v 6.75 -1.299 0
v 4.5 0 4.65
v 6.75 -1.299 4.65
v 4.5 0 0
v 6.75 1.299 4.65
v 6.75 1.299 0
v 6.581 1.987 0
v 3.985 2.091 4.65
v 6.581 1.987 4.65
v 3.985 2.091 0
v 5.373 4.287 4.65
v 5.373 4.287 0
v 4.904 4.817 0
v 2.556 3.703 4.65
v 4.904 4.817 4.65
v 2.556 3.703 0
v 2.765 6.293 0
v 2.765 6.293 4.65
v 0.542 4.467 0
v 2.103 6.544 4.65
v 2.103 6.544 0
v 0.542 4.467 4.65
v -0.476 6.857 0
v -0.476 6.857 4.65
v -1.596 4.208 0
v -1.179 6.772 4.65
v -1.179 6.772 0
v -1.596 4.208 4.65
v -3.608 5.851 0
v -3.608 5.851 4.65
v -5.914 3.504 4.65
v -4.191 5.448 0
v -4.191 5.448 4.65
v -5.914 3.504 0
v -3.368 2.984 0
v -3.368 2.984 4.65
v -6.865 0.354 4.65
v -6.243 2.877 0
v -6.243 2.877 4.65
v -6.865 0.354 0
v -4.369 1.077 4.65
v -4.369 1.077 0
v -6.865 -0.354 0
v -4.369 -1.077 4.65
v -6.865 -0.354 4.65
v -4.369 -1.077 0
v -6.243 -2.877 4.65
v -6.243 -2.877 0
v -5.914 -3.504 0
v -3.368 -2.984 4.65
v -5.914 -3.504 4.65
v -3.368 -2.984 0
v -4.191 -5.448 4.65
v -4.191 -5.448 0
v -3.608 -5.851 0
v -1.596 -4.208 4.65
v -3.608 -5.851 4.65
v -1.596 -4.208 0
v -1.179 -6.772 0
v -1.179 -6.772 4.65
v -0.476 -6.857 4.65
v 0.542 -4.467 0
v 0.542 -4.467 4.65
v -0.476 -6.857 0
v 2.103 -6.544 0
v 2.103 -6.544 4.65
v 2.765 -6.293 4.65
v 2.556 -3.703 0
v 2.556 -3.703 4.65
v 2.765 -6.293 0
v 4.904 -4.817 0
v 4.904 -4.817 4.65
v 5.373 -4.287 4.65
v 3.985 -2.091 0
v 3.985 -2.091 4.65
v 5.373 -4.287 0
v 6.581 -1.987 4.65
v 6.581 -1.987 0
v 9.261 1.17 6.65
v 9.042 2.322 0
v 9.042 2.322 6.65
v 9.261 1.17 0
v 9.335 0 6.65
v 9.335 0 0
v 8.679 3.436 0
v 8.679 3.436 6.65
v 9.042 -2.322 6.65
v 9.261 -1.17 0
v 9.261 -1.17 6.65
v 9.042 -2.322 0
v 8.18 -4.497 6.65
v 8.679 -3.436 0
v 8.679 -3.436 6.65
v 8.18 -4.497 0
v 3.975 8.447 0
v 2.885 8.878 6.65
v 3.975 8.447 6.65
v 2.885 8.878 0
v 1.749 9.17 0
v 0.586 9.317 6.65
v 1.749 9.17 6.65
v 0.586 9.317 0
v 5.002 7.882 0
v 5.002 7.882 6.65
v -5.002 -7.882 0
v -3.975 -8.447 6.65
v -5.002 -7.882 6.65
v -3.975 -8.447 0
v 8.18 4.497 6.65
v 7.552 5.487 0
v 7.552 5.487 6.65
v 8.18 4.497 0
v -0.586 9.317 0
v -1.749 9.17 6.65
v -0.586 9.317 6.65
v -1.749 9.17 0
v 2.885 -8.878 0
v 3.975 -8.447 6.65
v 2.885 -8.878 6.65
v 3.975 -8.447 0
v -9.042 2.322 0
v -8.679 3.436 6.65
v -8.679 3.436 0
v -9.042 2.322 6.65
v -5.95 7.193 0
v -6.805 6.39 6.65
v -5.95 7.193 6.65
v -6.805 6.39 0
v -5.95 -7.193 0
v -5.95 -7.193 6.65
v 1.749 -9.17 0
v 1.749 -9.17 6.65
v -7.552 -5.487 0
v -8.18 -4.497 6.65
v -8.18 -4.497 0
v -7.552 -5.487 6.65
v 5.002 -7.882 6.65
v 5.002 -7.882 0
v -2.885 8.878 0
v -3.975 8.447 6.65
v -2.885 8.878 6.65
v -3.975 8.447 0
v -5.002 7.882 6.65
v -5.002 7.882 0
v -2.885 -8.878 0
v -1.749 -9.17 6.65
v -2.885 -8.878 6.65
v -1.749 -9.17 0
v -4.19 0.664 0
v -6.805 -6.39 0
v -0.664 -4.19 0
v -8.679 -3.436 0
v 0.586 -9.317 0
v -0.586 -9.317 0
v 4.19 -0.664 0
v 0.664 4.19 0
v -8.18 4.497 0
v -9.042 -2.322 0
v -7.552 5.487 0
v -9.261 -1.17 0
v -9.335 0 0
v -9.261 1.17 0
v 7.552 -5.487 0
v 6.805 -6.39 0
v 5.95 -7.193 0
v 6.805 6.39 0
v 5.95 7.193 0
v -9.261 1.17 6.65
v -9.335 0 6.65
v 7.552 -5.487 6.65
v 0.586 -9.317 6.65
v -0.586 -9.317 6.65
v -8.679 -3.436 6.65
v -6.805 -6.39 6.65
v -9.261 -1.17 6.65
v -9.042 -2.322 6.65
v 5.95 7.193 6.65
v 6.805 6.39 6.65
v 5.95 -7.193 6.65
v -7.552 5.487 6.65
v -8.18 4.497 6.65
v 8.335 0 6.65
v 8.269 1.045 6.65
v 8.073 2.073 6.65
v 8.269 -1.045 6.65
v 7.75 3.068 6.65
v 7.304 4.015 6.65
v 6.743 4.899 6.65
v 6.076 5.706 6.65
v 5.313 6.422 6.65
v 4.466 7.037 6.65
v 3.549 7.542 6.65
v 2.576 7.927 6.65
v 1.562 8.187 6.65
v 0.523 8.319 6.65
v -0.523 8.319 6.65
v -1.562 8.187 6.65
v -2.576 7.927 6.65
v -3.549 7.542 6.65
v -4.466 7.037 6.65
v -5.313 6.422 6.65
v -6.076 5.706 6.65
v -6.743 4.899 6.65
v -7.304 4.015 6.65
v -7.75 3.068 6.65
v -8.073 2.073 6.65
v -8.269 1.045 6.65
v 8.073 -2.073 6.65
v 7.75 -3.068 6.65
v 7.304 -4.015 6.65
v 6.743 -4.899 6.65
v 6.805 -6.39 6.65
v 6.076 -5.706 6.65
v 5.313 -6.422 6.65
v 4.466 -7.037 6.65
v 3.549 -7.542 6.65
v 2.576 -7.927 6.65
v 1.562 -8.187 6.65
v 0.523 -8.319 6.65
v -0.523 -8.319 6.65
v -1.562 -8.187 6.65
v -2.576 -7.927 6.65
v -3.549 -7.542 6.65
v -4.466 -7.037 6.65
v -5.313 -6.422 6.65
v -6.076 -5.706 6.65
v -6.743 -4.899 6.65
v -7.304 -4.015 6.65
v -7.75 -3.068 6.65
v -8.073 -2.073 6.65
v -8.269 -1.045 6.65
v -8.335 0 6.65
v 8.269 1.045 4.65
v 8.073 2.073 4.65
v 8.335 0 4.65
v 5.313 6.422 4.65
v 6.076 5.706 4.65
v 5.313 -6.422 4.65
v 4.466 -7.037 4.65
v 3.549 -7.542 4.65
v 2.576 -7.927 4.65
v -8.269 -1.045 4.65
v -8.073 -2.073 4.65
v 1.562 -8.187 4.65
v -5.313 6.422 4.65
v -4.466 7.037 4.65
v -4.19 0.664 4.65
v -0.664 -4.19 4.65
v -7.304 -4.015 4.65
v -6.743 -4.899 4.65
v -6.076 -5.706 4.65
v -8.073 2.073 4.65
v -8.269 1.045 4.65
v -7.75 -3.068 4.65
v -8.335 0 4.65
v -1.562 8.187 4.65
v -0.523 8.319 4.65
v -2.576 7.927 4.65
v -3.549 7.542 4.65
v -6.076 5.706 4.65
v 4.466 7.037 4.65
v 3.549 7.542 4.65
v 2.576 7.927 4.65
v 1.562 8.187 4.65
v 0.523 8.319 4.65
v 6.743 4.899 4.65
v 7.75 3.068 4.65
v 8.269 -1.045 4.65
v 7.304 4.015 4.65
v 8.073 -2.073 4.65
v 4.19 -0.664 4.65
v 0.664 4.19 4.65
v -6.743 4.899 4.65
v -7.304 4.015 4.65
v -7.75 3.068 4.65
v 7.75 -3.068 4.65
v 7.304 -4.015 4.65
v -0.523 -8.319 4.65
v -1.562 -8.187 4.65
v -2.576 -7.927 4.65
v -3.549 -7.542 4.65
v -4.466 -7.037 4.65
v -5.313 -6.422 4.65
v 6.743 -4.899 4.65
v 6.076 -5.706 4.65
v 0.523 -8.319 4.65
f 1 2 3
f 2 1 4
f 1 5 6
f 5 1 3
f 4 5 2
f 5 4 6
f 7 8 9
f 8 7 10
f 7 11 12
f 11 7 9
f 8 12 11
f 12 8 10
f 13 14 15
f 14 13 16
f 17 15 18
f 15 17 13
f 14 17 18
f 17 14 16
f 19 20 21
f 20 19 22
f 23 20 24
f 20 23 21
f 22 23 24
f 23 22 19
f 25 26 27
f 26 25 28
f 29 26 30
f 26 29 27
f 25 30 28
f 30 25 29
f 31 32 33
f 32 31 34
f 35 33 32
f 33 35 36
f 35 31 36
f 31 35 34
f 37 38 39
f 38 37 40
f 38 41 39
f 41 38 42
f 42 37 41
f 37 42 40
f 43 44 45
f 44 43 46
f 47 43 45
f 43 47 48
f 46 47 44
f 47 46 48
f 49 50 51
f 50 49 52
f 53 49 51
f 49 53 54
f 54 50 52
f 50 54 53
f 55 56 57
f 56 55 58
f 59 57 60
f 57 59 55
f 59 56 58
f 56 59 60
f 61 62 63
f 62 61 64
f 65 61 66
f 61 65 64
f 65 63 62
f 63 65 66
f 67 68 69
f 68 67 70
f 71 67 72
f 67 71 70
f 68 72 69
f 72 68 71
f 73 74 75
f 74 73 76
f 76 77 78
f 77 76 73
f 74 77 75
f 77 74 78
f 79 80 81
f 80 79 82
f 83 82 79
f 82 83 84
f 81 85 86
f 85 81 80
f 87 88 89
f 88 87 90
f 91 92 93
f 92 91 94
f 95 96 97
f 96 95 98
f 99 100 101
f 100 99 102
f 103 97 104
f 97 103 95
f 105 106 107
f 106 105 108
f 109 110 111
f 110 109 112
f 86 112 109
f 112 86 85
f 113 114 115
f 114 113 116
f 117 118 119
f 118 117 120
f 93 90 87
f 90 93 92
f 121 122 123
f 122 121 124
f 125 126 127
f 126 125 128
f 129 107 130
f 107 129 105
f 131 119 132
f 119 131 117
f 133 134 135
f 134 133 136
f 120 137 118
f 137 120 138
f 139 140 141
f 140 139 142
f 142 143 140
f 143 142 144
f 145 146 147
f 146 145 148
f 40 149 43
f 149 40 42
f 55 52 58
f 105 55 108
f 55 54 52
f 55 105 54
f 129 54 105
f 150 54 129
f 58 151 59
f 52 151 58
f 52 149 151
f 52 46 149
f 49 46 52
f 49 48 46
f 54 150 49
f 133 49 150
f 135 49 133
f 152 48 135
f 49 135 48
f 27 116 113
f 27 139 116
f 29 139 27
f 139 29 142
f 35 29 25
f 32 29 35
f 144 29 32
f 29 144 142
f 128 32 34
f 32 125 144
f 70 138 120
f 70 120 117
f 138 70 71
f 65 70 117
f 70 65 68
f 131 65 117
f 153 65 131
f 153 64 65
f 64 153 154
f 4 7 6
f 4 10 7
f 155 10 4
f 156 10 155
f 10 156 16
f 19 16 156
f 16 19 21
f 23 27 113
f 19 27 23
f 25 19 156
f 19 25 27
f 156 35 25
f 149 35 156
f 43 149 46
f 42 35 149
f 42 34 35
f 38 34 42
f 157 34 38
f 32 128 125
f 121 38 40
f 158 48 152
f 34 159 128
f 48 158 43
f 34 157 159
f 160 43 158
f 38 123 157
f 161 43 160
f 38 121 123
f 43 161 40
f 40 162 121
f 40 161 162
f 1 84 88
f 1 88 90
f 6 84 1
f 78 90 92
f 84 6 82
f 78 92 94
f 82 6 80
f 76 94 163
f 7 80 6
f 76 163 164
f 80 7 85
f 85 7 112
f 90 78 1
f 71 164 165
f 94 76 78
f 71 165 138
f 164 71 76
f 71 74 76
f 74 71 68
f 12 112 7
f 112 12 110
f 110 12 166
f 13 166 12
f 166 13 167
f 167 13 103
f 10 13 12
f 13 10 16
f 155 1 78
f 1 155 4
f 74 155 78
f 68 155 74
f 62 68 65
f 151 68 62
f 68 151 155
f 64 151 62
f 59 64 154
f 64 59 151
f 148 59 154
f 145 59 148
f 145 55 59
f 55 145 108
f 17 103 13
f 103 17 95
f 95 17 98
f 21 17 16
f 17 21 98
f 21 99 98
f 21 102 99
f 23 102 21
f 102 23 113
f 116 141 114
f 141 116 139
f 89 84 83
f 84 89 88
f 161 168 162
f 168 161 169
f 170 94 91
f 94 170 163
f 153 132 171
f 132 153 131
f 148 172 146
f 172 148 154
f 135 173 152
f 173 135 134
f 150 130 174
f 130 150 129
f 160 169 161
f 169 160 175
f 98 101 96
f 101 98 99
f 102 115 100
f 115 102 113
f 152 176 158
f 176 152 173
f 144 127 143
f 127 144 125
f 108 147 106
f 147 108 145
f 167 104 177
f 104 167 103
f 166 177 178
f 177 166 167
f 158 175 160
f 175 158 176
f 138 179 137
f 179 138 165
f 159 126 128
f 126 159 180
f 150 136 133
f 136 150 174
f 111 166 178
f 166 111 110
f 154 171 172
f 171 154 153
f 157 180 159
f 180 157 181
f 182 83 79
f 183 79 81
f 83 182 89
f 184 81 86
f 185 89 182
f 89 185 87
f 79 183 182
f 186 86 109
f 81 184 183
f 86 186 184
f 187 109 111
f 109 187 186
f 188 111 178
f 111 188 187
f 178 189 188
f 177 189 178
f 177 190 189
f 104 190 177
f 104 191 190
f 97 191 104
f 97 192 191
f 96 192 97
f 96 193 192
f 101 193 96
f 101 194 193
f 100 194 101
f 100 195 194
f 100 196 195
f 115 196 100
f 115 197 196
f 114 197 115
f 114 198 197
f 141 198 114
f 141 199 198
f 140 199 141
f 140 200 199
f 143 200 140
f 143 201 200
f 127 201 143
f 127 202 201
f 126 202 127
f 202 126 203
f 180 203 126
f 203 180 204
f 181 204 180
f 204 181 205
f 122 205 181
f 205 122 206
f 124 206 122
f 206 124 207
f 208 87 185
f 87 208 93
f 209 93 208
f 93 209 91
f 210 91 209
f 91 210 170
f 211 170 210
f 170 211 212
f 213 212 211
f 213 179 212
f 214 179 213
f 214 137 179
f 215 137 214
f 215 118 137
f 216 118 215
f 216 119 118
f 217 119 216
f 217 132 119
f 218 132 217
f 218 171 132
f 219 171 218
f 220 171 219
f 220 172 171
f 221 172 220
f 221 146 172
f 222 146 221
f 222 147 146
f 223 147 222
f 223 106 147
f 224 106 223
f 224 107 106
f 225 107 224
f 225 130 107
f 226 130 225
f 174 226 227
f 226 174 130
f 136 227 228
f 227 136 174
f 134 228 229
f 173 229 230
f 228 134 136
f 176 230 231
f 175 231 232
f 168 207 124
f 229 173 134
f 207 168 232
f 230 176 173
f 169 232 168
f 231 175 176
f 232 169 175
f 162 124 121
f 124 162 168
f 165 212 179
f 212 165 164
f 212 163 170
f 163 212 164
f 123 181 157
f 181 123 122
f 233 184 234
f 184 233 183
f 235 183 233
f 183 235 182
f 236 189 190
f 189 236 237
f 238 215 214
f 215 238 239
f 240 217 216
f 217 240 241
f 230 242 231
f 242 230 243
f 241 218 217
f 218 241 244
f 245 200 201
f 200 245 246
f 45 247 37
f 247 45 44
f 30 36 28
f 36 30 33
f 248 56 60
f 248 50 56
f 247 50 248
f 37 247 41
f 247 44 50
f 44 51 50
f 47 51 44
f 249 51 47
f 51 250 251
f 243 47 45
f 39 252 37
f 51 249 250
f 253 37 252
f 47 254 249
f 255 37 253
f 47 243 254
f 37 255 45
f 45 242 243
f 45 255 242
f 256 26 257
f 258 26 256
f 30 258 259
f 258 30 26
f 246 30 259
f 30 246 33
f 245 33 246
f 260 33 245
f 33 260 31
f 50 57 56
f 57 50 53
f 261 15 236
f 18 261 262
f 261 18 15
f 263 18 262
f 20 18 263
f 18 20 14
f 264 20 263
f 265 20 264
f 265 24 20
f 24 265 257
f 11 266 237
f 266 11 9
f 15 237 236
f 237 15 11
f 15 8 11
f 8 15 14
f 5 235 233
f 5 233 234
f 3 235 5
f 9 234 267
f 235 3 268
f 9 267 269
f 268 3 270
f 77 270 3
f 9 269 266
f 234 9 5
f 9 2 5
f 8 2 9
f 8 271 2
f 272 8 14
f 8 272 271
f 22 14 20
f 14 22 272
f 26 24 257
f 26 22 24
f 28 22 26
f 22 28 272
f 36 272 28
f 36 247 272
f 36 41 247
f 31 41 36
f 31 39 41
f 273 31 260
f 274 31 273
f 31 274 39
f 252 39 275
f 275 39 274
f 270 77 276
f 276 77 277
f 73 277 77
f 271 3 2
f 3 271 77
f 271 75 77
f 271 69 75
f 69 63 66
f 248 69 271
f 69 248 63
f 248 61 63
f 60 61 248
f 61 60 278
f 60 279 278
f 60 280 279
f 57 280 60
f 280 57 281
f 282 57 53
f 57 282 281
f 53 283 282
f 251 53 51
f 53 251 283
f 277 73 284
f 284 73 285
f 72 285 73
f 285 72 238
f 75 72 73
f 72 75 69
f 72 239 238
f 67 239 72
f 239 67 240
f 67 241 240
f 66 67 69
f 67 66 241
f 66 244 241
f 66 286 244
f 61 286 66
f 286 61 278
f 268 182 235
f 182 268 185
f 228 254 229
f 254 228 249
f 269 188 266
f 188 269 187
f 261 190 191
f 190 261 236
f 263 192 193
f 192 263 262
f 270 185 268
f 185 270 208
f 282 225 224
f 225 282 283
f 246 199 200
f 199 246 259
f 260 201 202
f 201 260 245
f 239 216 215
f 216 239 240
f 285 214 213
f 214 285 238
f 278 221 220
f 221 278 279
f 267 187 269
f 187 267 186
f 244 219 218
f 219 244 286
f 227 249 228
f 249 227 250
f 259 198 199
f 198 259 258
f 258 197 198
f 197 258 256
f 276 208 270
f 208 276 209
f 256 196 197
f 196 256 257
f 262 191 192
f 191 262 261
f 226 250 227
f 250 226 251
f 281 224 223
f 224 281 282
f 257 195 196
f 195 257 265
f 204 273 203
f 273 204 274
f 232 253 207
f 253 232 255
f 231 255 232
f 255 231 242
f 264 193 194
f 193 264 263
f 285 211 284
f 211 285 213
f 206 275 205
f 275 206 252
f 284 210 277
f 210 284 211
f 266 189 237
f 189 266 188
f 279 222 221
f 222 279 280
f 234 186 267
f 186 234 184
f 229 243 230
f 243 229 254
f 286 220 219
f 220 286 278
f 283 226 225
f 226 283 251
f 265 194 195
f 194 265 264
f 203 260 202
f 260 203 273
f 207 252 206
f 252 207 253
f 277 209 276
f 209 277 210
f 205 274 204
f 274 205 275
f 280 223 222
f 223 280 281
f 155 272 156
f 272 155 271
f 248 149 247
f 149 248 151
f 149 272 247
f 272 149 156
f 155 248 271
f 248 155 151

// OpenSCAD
outer_dia =  18.67;
lip_height = 2;
lip_width = 1;
total_height = 6.65;

led_length = 6;
led_width = 6;

difference() {

cylinder(r=outer_dia/2, h=total_height, $fn=50);
translate([0, 0, total_height - lip_height]) cylinder(r=(outer_dia/2) - lip_width, h=lip_height + 1, $fn=50);

rotate(360/10,[0,0,1]) translate([-led_length/2,-led_width/2, -1]) cube([led_length, led_width, total_height + 2]);


for (i = [0 : 12]) {

rotate(i * (360/13),[0,0,1]) translate([6,0,-1]) polyhole(total_height + 2, 1.5);
 }
}


module polyhole(h, d) {
    n = max(round(2 * d),3);
    rotate([0,0,180])
        cylinder(h = h, r = (d / 2) / cos (180 / n), $fn = n);
}
